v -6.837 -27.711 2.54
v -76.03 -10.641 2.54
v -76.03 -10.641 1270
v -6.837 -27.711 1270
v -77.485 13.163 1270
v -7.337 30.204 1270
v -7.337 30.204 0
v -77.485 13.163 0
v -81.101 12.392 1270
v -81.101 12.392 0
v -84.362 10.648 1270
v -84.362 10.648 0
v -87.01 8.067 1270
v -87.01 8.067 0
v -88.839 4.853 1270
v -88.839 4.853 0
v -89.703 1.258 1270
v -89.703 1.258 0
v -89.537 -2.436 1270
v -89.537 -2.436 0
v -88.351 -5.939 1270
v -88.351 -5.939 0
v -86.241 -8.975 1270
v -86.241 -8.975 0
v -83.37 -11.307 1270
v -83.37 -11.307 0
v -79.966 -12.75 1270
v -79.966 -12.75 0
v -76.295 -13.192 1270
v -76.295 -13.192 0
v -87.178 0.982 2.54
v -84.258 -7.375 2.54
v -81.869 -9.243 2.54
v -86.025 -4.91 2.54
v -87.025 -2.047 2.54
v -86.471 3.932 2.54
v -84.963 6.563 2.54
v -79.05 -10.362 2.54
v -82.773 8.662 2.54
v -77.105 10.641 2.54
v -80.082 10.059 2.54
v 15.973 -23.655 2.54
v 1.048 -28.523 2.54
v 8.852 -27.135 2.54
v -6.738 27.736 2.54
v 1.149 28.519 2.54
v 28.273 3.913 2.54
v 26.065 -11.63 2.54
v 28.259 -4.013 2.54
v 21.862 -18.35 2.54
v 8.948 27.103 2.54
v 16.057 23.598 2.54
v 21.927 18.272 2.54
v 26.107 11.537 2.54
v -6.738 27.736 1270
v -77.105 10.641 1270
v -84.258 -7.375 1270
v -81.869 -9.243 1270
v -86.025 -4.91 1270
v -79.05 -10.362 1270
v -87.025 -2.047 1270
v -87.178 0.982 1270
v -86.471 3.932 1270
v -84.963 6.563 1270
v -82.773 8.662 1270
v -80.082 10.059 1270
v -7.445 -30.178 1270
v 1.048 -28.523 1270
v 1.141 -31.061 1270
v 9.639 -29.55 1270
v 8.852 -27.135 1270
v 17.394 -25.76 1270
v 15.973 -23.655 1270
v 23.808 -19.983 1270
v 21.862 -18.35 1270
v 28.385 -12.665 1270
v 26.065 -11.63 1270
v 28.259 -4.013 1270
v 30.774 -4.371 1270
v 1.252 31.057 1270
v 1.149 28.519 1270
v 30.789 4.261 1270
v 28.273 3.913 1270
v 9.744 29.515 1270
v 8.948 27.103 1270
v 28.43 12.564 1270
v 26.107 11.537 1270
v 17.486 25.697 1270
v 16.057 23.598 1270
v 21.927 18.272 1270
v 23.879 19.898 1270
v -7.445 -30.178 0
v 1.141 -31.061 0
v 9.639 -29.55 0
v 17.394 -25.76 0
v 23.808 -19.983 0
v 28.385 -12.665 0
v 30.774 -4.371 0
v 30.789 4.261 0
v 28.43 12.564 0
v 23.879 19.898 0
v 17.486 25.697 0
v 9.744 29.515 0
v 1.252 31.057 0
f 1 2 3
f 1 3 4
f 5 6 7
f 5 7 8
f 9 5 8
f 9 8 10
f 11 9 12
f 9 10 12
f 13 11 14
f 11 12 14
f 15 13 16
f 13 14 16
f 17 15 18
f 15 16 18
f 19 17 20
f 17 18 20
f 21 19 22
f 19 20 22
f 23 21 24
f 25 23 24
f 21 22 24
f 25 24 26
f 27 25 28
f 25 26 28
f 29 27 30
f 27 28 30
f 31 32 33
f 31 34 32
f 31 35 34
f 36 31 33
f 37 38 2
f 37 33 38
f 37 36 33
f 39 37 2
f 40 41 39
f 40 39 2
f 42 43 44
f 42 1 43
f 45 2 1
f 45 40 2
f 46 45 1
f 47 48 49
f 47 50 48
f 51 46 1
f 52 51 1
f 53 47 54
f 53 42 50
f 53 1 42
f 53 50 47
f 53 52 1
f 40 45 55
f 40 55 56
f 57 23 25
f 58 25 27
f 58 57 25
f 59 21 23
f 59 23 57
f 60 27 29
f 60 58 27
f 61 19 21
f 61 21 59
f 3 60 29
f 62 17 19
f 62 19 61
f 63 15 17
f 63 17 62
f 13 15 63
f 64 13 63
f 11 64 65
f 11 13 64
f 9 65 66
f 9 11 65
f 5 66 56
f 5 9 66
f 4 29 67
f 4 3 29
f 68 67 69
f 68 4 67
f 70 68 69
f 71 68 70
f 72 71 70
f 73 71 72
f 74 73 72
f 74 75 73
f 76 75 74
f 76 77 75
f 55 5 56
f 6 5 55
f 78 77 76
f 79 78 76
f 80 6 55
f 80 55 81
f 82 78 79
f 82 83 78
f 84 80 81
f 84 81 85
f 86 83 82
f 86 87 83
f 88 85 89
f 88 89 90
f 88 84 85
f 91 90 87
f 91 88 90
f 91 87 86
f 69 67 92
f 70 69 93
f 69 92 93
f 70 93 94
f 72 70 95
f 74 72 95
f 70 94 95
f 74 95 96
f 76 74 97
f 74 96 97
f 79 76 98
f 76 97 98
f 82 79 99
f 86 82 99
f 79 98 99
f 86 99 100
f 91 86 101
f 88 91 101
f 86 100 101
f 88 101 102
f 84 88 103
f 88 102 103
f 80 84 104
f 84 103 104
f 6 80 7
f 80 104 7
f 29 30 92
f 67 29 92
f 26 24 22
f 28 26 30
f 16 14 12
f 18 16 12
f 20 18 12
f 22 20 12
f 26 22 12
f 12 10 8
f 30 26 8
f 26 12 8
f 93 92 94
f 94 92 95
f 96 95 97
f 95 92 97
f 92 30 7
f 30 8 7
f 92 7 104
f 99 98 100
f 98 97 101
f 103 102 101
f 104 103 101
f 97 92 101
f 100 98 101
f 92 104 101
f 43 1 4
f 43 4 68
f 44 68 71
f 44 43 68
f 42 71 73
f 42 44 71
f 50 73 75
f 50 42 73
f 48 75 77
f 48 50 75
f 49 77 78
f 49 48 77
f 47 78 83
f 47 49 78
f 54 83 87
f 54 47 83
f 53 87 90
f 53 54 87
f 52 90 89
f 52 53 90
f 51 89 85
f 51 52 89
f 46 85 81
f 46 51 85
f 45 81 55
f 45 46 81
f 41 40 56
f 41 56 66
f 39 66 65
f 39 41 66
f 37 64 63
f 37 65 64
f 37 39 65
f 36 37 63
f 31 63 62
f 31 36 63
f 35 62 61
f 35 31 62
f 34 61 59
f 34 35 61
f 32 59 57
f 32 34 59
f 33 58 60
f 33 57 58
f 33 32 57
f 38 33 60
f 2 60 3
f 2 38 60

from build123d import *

# Parameters (mm, degrees)
F1_DEPTH = 1270
F2_T     = -2.54


with BuildPart() as f1:
    # F0 (on Top) → F1 (new body)
    with BuildSketch(Plane.XY):
        with BuildLine():
            Line((-76.2946611271, -13.1918803182), (-7.4450064273, -30.1775547845))
            ThreePointArc((-7.4450064273, -30.1775547845), (31.0823079854, -0.0553513609), (-7.3374791949, 30.2038794286))
            Line((-7.3374791949, 30.2038794286), (-77.4847210084, 13.1628920746))
            ThreePointArc((-77.4847210084, 13.1628920746), (-89.7500027986, -0.5952064431), (-76.2946611271, -13.1918803182))
        make_face()
    extrude(amount=F1_DEPTH)

    # F2
    f2_openings = [f1.faces().sort_by_distance(p)[0] for p in [
        (-22.239266, 0.032692, 1270),
    ]]
    offset(amount=F2_T, openings=f2_openings, kind=Kind.INTERSECTION)


solid = f1.part
